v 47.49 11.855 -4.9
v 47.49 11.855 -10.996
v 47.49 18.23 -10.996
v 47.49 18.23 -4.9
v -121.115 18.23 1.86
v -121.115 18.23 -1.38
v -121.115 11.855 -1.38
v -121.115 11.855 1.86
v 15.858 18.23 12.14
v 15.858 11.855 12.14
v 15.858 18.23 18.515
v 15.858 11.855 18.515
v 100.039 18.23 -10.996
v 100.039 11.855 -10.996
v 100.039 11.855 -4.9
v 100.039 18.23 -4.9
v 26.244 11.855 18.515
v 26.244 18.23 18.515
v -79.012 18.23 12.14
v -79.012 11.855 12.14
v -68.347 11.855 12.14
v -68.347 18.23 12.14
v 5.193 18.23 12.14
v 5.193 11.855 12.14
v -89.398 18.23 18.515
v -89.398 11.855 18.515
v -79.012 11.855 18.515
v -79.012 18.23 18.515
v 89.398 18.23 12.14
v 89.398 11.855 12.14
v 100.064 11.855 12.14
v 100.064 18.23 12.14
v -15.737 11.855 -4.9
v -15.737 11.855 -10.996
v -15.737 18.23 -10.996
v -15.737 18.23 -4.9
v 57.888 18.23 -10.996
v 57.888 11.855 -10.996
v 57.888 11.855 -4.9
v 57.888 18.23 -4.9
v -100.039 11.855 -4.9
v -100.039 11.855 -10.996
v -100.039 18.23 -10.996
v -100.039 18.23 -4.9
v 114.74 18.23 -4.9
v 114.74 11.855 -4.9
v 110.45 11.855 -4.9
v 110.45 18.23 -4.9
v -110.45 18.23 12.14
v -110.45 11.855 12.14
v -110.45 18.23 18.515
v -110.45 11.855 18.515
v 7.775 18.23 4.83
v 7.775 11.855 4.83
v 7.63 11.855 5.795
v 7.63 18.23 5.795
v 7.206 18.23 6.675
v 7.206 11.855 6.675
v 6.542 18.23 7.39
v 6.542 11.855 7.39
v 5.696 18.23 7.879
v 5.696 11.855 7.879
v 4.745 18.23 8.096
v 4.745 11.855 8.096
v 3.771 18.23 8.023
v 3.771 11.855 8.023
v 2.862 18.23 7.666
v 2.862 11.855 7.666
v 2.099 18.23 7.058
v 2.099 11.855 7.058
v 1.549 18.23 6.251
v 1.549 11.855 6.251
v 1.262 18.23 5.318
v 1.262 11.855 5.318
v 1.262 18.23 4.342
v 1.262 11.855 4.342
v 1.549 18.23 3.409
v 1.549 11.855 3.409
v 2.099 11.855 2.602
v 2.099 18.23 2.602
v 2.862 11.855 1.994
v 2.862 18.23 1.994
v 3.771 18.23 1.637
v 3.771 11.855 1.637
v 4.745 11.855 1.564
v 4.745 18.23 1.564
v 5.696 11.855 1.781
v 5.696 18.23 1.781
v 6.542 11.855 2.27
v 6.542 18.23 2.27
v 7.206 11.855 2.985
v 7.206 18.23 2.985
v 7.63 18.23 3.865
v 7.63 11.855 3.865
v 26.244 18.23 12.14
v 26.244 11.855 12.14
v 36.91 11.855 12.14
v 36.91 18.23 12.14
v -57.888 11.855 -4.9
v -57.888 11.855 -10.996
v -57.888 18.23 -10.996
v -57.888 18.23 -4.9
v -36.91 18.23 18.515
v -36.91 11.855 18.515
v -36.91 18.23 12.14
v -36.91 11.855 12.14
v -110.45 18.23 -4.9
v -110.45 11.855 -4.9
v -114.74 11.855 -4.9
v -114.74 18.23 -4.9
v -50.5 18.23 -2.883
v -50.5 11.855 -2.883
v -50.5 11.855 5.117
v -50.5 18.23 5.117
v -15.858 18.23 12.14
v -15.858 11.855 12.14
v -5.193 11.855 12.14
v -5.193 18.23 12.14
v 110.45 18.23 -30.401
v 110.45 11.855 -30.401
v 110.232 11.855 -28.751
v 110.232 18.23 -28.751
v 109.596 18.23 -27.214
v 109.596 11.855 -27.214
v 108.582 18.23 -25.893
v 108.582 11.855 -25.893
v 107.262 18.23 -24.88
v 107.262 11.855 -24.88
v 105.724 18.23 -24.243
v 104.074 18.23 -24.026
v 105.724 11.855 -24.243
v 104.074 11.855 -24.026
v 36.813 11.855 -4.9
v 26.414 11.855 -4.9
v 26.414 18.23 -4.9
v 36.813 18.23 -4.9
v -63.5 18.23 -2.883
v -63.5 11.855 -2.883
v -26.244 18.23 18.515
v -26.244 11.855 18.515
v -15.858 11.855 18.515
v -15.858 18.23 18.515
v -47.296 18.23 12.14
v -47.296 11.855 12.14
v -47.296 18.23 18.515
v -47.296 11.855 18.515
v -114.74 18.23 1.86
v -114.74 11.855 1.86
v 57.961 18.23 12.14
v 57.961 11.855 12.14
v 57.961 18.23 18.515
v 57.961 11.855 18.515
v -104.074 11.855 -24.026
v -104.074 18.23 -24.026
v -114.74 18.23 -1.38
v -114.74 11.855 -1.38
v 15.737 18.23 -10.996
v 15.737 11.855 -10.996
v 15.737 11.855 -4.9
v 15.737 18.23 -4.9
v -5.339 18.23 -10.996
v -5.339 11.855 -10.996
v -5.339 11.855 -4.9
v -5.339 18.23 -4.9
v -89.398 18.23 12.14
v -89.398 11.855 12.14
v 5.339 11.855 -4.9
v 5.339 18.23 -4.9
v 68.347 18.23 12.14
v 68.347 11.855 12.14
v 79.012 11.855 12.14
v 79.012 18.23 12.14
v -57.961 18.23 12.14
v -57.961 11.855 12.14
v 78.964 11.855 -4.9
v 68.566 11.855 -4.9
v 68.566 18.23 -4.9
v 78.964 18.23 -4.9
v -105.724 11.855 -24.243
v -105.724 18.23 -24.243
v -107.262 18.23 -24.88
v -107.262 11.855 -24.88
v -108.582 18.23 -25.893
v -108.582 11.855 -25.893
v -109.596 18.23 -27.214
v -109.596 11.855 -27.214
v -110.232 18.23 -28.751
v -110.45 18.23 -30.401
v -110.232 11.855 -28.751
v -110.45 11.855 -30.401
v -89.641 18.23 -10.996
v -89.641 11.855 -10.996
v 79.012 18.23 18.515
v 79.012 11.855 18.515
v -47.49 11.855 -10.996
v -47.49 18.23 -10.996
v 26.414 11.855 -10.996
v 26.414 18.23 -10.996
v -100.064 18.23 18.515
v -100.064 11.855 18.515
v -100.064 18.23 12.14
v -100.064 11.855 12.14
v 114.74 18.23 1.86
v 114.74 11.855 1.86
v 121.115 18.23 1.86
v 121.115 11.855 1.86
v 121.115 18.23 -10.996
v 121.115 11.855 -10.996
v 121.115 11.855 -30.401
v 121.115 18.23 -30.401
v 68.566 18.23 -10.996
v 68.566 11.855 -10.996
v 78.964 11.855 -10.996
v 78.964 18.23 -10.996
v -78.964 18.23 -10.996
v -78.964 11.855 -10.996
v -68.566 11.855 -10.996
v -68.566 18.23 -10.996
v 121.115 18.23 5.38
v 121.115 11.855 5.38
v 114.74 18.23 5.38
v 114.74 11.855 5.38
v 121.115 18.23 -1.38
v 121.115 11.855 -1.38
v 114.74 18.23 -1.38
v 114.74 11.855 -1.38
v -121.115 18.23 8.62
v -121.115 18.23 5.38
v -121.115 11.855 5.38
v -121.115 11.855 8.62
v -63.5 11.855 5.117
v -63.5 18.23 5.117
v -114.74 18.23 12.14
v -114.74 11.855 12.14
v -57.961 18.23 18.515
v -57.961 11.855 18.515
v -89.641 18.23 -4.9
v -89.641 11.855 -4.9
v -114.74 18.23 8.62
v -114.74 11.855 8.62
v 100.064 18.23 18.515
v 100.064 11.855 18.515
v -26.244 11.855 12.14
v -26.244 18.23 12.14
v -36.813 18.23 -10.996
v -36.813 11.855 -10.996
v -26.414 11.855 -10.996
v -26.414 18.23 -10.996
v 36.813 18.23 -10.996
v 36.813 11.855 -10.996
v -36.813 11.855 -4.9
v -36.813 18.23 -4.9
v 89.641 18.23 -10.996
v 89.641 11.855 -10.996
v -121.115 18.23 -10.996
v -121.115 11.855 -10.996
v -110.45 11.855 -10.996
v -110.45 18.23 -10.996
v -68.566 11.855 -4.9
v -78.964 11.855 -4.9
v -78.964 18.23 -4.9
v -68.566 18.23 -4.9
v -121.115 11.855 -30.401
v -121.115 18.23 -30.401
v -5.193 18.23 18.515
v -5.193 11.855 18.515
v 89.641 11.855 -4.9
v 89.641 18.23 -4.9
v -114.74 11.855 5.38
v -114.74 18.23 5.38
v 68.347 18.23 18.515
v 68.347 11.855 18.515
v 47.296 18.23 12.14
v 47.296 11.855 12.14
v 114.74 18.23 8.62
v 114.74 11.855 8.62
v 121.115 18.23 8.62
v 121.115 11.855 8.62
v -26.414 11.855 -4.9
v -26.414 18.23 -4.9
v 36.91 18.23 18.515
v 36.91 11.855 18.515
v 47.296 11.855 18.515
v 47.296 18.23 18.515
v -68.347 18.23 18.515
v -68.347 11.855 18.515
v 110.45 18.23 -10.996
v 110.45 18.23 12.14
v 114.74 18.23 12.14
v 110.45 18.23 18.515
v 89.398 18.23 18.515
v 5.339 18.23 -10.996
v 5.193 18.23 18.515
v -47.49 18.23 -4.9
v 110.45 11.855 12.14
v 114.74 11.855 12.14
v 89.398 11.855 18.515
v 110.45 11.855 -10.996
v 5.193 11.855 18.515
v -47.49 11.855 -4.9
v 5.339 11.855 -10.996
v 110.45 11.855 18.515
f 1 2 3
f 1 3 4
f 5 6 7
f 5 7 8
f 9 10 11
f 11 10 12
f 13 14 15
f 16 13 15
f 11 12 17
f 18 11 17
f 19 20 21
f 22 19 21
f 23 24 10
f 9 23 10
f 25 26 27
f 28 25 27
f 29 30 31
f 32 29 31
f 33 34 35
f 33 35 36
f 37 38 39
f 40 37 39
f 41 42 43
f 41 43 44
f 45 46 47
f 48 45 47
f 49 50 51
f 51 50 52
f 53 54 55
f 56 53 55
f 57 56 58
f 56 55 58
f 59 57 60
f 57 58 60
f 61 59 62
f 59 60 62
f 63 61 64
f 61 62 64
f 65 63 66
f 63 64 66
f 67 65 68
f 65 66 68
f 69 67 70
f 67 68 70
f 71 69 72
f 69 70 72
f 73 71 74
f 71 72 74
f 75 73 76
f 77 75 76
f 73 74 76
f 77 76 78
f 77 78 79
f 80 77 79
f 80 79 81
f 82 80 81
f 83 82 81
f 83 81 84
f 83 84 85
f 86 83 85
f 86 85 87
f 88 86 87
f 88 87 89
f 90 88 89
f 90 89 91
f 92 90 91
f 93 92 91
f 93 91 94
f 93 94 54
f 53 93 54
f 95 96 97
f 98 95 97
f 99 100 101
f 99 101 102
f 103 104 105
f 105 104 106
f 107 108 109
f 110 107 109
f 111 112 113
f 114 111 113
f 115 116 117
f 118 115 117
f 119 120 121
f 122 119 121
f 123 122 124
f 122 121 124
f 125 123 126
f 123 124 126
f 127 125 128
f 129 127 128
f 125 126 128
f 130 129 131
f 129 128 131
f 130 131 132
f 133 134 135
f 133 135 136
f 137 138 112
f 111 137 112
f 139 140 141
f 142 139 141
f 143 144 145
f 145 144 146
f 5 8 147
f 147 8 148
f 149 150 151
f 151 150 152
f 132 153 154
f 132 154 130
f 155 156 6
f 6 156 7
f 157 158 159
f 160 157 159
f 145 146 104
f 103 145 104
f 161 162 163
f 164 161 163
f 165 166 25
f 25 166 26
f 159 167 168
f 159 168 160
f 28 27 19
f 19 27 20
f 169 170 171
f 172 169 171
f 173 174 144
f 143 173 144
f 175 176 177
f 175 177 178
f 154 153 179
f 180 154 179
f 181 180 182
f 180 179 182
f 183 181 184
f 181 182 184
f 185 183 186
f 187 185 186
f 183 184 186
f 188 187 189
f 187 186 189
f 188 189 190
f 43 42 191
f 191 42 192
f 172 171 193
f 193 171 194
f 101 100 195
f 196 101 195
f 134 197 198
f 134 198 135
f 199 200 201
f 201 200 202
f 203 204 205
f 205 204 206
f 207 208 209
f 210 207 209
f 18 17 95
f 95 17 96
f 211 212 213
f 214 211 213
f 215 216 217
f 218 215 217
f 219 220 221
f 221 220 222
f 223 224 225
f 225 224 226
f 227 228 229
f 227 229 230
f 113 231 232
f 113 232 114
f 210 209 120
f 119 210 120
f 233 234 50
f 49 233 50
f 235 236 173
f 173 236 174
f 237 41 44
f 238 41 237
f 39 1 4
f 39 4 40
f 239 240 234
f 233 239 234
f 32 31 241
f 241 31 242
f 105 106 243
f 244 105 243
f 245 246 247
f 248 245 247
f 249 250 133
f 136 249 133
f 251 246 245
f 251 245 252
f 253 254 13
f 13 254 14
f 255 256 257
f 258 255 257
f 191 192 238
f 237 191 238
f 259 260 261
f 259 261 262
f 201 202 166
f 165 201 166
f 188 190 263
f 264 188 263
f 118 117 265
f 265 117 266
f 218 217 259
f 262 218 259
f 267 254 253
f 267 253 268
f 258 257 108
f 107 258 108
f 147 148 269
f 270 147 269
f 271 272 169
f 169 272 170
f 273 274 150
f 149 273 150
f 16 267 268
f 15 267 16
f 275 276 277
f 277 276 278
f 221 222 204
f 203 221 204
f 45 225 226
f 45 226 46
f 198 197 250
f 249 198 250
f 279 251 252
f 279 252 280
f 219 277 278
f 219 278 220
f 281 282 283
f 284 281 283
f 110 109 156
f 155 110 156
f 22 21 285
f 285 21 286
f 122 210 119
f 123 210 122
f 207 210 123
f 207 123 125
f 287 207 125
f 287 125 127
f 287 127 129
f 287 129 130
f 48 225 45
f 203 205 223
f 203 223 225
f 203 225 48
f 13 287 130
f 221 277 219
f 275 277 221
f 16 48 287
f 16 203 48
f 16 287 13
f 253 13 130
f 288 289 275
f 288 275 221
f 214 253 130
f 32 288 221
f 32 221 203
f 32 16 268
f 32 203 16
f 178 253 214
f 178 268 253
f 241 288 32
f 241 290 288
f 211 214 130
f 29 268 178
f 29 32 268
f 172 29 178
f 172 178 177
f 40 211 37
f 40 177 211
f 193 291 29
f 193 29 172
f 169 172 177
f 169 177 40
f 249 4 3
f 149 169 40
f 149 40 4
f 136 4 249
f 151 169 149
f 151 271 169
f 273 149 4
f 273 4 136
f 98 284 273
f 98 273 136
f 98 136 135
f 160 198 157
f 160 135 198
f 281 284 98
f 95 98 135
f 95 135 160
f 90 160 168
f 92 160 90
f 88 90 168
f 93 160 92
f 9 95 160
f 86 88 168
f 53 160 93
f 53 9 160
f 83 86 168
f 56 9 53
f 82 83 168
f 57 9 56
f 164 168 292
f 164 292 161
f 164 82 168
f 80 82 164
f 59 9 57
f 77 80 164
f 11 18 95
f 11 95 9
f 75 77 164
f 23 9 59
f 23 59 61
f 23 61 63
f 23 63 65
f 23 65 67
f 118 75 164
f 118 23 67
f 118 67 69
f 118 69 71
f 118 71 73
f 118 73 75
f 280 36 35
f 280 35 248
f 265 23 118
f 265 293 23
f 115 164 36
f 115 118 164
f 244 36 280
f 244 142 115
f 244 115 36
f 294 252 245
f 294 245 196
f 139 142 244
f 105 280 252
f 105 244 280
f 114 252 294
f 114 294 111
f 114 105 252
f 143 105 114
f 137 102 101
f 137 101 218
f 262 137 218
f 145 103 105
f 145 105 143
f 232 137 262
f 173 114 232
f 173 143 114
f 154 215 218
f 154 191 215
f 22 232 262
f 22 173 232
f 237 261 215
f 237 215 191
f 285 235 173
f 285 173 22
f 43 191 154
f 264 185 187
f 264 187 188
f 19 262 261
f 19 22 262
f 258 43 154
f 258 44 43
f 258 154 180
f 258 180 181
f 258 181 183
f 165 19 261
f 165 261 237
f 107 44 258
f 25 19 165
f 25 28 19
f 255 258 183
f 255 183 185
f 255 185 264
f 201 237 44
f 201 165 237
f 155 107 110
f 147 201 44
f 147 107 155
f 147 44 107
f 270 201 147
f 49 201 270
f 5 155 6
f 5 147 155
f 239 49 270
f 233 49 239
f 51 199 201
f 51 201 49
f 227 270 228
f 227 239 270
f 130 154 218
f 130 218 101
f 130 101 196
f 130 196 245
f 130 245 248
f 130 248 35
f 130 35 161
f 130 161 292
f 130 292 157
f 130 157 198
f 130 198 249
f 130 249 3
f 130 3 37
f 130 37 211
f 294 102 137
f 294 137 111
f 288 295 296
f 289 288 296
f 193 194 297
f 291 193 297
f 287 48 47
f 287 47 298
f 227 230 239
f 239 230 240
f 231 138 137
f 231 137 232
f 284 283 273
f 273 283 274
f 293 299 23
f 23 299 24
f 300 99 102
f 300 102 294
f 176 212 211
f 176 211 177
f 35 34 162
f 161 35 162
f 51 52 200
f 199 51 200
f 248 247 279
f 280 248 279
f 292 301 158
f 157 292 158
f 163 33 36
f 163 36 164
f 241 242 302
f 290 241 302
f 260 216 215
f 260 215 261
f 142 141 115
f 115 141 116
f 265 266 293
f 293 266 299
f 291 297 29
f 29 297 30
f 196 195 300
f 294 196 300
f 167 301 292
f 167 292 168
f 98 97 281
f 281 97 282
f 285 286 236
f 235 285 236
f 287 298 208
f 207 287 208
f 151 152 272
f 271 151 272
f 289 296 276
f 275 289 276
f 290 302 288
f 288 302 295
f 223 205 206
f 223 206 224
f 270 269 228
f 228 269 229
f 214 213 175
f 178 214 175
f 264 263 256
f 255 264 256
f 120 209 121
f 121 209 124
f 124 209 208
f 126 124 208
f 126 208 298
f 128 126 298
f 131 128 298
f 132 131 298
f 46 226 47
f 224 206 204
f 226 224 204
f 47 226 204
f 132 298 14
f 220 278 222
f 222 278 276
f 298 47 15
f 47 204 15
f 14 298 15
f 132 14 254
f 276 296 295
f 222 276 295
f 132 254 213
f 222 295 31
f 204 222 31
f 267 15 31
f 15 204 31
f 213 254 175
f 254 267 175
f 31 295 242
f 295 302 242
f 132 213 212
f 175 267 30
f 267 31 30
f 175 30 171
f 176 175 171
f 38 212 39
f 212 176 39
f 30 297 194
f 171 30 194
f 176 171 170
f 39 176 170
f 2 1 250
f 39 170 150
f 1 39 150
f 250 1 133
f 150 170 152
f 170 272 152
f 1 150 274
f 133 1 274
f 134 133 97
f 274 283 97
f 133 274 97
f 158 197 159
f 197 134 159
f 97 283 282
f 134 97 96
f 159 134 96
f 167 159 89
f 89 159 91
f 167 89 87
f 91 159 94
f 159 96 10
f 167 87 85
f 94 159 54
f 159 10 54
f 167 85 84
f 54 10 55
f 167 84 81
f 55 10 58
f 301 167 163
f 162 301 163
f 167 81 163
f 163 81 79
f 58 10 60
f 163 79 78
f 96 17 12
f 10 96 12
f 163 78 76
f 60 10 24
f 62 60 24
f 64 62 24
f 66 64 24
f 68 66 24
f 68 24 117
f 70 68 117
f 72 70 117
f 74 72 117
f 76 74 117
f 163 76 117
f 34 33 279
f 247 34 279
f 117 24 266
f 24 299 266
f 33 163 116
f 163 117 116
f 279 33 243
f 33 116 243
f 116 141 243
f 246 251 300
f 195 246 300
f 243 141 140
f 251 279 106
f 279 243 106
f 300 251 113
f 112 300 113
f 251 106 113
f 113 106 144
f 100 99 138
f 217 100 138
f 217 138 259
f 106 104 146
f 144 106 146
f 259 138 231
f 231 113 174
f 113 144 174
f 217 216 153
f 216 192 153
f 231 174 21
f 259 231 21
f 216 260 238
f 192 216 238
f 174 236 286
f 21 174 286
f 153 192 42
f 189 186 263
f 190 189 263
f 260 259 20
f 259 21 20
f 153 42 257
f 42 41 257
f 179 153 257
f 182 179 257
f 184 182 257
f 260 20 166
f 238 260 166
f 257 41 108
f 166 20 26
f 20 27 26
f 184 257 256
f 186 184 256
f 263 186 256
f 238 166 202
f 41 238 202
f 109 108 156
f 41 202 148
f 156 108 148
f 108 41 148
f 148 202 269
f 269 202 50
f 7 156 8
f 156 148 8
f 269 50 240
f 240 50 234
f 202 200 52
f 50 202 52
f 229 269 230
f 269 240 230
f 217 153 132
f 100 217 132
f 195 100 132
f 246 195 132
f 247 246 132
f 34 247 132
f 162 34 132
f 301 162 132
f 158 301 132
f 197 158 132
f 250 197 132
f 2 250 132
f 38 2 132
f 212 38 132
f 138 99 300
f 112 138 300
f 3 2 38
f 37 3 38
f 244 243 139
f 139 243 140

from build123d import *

# Parameters (mm, degrees)
PAD006_DEPTH    = 6.3754
SKETCH009_W     = 10.398121
SKETCH009_H     = 6.096
SKETCH009_W_2   = 10.398122
POCKET002_DEPTH = 7.3754
SKETCH011_R     = 3.275
SKETCH011_W     = 13
SKETCH011_H     = 8
POCKET004_DEPTH = 7.3754


with BuildPart() as part:
    # Sketch008 (on DatumPlane) → Pad006 (new body)
    with BuildSketch(Plane.XZ.offset(-11.8547)):
        with BuildLine():
            Line((-110.449725, -30.4013), (-121.115098, -30.4013))
            Line((-121.115098, -30.4013), (-121.115098, -10.9957))
            Line((-121.115098, -10.9957), (-110.449725, -10.9957))
            Line((-110.449725, -10.9957), (-110.449725, -4.8997))
            Line((-110.449725, -4.8997), (-114.739698, -4.8997))
            Line((-114.739698, -4.8997), (-114.739698, -1.38006))
            Line((-114.739698, -1.38006), (-121.115098, -1.38006))
            Line((-121.115098, -1.38006), (-121.115098, 1.86018))
            Line((-121.115098, 1.86018), (-114.739698, 1.86018))
            Line((-114.739698, 1.86018), (-114.739698, 5.37982))
            Line((-114.739698, 5.37982), (-121.115098, 5.37982))
            Line((-121.115098, 5.37982), (-121.115098, 8.62006))
            Line((-121.115098, 8.62006), (-114.739698, 8.62006))
            Line((-114.739698, 8.62006), (-114.739698, 12.1397))
            Line((-114.739698, 12.1397), (-110.449725, 12.1397))
            Line((-110.449725, 12.1397), (-110.449725, 18.5151))
            Line((-110.449725, 18.5151), (-100.063751, 18.5151))
            Line((-100.063751, 18.5151), (-100.063751, 12.1397))
            Line((-100.063751, 12.1397), (-89.398377, 12.1397))
            Line((-89.398377, 12.1397), (-89.398377, 18.5151))
            Line((-89.398377, 18.5151), (-79.012403, 18.5151))
            Line((-79.012403, 18.5151), (-79.012403, 12.1397))
            Line((-79.012403, 12.1397), (-68.34703, 12.1397))
            Line((-68.34703, 12.1397), (-68.34703, 18.5151))
            Line((-68.34703, 18.5151), (-57.961056, 18.5151))
            Line((-57.961056, 18.5151), (-57.961056, 12.1397))
            Line((-57.961056, 12.1397), (-47.295682, 12.1397))
            Line((-47.295682, 12.1397), (-47.295682, 18.5151))
            Line((-47.295682, 18.5151), (-36.909708, 18.5151))
            Line((-36.909708, 18.5151), (-36.909708, 12.1397))
            Line((-36.909708, 12.1397), (-26.244334, 12.1397))
            Line((-26.244334, 12.1397), (-26.244334, 18.5151))
            Line((-26.244334, 18.5151), (-15.858361, 18.5151))
            Line((-15.858361, 18.5151), (-15.858361, 12.1397))
            Line((-15.858361, 12.1397), (-5.192987, 12.1397))
            Line((-5.192987, 12.1397), (-5.192987, 18.5151))
            Line((-5.192987, 18.5151), (5.192987, 18.5151))
            Line((5.192987, 18.5151), (5.192987, 12.1397))
            Line((5.192987, 12.1397), (15.858361, 12.1397))
            Line((15.858361, 12.1397), (15.858361, 18.5151))
            Line((15.858361, 18.5151), (26.244334, 18.5151))
            Line((26.244334, 18.5151), (26.244334, 12.1397))
            Line((26.244334, 12.1397), (36.909708, 12.1397))
            Line((36.909708, 12.1397), (36.909708, 18.5151))
            Line((36.909708, 18.5151), (47.295682, 18.5151))
            Line((47.295682, 18.5151), (47.295682, 12.1397))
            Line((47.295682, 12.1397), (57.961056, 12.1397))
            Line((57.961056, 12.1397), (57.961056, 18.5151))
            Line((57.961056, 18.5151), (68.34703, 18.5151))
            Line((68.34703, 18.5151), (68.34703, 12.1397))
            Line((68.34703, 12.1397), (79.012403, 12.1397))
            Line((79.012403, 12.1397), (79.012403, 18.5151))
            Line((79.012403, 18.5151), (89.398377, 18.5151))
            Line((89.398377, 18.5151), (89.398377, 12.1397))
            Line((89.398377, 12.1397), (100.063751, 12.1397))
            Line((100.063751, 12.1397), (100.063751, 18.5151))
            Line((100.063751, 18.5151), (110.449725, 18.5151))
            Line((110.449725, 18.5151), (110.449725, 12.1397))
            Line((110.449725, 12.1397), (114.739698, 12.1397))
            Line((114.739698, 12.1397), (114.739698, 8.62006))
            Line((114.739698, 8.62006), (121.115098, 8.62006))
            Line((121.115098, 8.62006), (121.115098, 5.37982))
            Line((121.115098, 5.37982), (114.739698, 5.37982))
            Line((114.739698, 5.37982), (114.739698, 1.86018))
            Line((114.739698, 1.86018), (121.115098, 1.86018))
            Line((121.115098, 1.86018), (121.115098, -1.38006))
            Line((121.115098, -1.38006), (114.739698, -1.38006))
            Line((114.739698, -1.38006), (114.739698, -4.8997))
            Line((114.739698, -4.8997), (110.449725, -4.8997))
            Line((110.449725, -4.8997), (110.449725, -10.9957))
            Line((110.449725, -10.9957), (121.115098, -10.9957))
            Line((121.115098, -10.9957), (121.115098, -30.4013))
            Line((121.115098, -30.4013), (110.449725, -30.4013))
            ThreePointArc((110.449725, -30.4013), (108.582413, -25.893211), (104.074325, -24.0259))
            Line((-104.074325, -24.0259), (104.074325, -24.0259))
            ThreePointArc((-104.074325, -24.0259), (-108.582413, -25.893211), (-110.449725, -30.4013))
        make_face()
    extrude(amount=-PAD006_DEPTH)

    # Sketch009 (on Face77 of Pad006) → Pocket002 (cut)
    with BuildSketch(Plane.XZ.offset(-11.8547)):
        with Locations((-94.840395, -7.9477)):
            Rectangle(SKETCH009_W, SKETCH009_H)
        with Locations((-73.764751, -7.9477)):
            Rectangle(SKETCH009_W_2, SKETCH009_H)
        with Locations((-52.689108, -7.9477)):
            Rectangle(SKETCH009_W_2, SKETCH009_H)
        with Locations((-31.613465, -7.9477)):
            Rectangle(SKETCH009_W_2, SKETCH009_H)
        with Locations((-10.537821, -7.9477)):
            Rectangle(SKETCH009_W, SKETCH009_H)
        with Locations((10.537821, -7.9477)):
            Rectangle(SKETCH009_W, SKETCH009_H)
        with Locations((31.613465, -7.9477)):
            Rectangle(SKETCH009_W_2, SKETCH009_H)
        with Locations((52.689108, -7.9477)):
            Rectangle(SKETCH009_W_2, SKETCH009_H)
        with Locations((73.764751, -7.9477)):
            Rectangle(SKETCH009_W_2, SKETCH009_H)
        with Locations((94.840395, -7.9477)):
            Rectangle(SKETCH009_W, SKETCH009_H)
    extrude(amount=-POCKET002_DEPTH, mode=Mode.SUBTRACT)

    # Sketch011 (on Face4 of Pocket002) → Pocket004 (cut)
    with BuildSketch(Plane.XZ.offset(-11.8547)):
        with Locations((4.5, 4.83)):
            Circle(SKETCH011_R)
        with Locations((-56.999992, 1.117064)):
            Rectangle(SKETCH011_W, SKETCH011_H)
    extrude(amount=-POCKET004_DEPTH, mode=Mode.SUBTRACT)


solid = part.part
